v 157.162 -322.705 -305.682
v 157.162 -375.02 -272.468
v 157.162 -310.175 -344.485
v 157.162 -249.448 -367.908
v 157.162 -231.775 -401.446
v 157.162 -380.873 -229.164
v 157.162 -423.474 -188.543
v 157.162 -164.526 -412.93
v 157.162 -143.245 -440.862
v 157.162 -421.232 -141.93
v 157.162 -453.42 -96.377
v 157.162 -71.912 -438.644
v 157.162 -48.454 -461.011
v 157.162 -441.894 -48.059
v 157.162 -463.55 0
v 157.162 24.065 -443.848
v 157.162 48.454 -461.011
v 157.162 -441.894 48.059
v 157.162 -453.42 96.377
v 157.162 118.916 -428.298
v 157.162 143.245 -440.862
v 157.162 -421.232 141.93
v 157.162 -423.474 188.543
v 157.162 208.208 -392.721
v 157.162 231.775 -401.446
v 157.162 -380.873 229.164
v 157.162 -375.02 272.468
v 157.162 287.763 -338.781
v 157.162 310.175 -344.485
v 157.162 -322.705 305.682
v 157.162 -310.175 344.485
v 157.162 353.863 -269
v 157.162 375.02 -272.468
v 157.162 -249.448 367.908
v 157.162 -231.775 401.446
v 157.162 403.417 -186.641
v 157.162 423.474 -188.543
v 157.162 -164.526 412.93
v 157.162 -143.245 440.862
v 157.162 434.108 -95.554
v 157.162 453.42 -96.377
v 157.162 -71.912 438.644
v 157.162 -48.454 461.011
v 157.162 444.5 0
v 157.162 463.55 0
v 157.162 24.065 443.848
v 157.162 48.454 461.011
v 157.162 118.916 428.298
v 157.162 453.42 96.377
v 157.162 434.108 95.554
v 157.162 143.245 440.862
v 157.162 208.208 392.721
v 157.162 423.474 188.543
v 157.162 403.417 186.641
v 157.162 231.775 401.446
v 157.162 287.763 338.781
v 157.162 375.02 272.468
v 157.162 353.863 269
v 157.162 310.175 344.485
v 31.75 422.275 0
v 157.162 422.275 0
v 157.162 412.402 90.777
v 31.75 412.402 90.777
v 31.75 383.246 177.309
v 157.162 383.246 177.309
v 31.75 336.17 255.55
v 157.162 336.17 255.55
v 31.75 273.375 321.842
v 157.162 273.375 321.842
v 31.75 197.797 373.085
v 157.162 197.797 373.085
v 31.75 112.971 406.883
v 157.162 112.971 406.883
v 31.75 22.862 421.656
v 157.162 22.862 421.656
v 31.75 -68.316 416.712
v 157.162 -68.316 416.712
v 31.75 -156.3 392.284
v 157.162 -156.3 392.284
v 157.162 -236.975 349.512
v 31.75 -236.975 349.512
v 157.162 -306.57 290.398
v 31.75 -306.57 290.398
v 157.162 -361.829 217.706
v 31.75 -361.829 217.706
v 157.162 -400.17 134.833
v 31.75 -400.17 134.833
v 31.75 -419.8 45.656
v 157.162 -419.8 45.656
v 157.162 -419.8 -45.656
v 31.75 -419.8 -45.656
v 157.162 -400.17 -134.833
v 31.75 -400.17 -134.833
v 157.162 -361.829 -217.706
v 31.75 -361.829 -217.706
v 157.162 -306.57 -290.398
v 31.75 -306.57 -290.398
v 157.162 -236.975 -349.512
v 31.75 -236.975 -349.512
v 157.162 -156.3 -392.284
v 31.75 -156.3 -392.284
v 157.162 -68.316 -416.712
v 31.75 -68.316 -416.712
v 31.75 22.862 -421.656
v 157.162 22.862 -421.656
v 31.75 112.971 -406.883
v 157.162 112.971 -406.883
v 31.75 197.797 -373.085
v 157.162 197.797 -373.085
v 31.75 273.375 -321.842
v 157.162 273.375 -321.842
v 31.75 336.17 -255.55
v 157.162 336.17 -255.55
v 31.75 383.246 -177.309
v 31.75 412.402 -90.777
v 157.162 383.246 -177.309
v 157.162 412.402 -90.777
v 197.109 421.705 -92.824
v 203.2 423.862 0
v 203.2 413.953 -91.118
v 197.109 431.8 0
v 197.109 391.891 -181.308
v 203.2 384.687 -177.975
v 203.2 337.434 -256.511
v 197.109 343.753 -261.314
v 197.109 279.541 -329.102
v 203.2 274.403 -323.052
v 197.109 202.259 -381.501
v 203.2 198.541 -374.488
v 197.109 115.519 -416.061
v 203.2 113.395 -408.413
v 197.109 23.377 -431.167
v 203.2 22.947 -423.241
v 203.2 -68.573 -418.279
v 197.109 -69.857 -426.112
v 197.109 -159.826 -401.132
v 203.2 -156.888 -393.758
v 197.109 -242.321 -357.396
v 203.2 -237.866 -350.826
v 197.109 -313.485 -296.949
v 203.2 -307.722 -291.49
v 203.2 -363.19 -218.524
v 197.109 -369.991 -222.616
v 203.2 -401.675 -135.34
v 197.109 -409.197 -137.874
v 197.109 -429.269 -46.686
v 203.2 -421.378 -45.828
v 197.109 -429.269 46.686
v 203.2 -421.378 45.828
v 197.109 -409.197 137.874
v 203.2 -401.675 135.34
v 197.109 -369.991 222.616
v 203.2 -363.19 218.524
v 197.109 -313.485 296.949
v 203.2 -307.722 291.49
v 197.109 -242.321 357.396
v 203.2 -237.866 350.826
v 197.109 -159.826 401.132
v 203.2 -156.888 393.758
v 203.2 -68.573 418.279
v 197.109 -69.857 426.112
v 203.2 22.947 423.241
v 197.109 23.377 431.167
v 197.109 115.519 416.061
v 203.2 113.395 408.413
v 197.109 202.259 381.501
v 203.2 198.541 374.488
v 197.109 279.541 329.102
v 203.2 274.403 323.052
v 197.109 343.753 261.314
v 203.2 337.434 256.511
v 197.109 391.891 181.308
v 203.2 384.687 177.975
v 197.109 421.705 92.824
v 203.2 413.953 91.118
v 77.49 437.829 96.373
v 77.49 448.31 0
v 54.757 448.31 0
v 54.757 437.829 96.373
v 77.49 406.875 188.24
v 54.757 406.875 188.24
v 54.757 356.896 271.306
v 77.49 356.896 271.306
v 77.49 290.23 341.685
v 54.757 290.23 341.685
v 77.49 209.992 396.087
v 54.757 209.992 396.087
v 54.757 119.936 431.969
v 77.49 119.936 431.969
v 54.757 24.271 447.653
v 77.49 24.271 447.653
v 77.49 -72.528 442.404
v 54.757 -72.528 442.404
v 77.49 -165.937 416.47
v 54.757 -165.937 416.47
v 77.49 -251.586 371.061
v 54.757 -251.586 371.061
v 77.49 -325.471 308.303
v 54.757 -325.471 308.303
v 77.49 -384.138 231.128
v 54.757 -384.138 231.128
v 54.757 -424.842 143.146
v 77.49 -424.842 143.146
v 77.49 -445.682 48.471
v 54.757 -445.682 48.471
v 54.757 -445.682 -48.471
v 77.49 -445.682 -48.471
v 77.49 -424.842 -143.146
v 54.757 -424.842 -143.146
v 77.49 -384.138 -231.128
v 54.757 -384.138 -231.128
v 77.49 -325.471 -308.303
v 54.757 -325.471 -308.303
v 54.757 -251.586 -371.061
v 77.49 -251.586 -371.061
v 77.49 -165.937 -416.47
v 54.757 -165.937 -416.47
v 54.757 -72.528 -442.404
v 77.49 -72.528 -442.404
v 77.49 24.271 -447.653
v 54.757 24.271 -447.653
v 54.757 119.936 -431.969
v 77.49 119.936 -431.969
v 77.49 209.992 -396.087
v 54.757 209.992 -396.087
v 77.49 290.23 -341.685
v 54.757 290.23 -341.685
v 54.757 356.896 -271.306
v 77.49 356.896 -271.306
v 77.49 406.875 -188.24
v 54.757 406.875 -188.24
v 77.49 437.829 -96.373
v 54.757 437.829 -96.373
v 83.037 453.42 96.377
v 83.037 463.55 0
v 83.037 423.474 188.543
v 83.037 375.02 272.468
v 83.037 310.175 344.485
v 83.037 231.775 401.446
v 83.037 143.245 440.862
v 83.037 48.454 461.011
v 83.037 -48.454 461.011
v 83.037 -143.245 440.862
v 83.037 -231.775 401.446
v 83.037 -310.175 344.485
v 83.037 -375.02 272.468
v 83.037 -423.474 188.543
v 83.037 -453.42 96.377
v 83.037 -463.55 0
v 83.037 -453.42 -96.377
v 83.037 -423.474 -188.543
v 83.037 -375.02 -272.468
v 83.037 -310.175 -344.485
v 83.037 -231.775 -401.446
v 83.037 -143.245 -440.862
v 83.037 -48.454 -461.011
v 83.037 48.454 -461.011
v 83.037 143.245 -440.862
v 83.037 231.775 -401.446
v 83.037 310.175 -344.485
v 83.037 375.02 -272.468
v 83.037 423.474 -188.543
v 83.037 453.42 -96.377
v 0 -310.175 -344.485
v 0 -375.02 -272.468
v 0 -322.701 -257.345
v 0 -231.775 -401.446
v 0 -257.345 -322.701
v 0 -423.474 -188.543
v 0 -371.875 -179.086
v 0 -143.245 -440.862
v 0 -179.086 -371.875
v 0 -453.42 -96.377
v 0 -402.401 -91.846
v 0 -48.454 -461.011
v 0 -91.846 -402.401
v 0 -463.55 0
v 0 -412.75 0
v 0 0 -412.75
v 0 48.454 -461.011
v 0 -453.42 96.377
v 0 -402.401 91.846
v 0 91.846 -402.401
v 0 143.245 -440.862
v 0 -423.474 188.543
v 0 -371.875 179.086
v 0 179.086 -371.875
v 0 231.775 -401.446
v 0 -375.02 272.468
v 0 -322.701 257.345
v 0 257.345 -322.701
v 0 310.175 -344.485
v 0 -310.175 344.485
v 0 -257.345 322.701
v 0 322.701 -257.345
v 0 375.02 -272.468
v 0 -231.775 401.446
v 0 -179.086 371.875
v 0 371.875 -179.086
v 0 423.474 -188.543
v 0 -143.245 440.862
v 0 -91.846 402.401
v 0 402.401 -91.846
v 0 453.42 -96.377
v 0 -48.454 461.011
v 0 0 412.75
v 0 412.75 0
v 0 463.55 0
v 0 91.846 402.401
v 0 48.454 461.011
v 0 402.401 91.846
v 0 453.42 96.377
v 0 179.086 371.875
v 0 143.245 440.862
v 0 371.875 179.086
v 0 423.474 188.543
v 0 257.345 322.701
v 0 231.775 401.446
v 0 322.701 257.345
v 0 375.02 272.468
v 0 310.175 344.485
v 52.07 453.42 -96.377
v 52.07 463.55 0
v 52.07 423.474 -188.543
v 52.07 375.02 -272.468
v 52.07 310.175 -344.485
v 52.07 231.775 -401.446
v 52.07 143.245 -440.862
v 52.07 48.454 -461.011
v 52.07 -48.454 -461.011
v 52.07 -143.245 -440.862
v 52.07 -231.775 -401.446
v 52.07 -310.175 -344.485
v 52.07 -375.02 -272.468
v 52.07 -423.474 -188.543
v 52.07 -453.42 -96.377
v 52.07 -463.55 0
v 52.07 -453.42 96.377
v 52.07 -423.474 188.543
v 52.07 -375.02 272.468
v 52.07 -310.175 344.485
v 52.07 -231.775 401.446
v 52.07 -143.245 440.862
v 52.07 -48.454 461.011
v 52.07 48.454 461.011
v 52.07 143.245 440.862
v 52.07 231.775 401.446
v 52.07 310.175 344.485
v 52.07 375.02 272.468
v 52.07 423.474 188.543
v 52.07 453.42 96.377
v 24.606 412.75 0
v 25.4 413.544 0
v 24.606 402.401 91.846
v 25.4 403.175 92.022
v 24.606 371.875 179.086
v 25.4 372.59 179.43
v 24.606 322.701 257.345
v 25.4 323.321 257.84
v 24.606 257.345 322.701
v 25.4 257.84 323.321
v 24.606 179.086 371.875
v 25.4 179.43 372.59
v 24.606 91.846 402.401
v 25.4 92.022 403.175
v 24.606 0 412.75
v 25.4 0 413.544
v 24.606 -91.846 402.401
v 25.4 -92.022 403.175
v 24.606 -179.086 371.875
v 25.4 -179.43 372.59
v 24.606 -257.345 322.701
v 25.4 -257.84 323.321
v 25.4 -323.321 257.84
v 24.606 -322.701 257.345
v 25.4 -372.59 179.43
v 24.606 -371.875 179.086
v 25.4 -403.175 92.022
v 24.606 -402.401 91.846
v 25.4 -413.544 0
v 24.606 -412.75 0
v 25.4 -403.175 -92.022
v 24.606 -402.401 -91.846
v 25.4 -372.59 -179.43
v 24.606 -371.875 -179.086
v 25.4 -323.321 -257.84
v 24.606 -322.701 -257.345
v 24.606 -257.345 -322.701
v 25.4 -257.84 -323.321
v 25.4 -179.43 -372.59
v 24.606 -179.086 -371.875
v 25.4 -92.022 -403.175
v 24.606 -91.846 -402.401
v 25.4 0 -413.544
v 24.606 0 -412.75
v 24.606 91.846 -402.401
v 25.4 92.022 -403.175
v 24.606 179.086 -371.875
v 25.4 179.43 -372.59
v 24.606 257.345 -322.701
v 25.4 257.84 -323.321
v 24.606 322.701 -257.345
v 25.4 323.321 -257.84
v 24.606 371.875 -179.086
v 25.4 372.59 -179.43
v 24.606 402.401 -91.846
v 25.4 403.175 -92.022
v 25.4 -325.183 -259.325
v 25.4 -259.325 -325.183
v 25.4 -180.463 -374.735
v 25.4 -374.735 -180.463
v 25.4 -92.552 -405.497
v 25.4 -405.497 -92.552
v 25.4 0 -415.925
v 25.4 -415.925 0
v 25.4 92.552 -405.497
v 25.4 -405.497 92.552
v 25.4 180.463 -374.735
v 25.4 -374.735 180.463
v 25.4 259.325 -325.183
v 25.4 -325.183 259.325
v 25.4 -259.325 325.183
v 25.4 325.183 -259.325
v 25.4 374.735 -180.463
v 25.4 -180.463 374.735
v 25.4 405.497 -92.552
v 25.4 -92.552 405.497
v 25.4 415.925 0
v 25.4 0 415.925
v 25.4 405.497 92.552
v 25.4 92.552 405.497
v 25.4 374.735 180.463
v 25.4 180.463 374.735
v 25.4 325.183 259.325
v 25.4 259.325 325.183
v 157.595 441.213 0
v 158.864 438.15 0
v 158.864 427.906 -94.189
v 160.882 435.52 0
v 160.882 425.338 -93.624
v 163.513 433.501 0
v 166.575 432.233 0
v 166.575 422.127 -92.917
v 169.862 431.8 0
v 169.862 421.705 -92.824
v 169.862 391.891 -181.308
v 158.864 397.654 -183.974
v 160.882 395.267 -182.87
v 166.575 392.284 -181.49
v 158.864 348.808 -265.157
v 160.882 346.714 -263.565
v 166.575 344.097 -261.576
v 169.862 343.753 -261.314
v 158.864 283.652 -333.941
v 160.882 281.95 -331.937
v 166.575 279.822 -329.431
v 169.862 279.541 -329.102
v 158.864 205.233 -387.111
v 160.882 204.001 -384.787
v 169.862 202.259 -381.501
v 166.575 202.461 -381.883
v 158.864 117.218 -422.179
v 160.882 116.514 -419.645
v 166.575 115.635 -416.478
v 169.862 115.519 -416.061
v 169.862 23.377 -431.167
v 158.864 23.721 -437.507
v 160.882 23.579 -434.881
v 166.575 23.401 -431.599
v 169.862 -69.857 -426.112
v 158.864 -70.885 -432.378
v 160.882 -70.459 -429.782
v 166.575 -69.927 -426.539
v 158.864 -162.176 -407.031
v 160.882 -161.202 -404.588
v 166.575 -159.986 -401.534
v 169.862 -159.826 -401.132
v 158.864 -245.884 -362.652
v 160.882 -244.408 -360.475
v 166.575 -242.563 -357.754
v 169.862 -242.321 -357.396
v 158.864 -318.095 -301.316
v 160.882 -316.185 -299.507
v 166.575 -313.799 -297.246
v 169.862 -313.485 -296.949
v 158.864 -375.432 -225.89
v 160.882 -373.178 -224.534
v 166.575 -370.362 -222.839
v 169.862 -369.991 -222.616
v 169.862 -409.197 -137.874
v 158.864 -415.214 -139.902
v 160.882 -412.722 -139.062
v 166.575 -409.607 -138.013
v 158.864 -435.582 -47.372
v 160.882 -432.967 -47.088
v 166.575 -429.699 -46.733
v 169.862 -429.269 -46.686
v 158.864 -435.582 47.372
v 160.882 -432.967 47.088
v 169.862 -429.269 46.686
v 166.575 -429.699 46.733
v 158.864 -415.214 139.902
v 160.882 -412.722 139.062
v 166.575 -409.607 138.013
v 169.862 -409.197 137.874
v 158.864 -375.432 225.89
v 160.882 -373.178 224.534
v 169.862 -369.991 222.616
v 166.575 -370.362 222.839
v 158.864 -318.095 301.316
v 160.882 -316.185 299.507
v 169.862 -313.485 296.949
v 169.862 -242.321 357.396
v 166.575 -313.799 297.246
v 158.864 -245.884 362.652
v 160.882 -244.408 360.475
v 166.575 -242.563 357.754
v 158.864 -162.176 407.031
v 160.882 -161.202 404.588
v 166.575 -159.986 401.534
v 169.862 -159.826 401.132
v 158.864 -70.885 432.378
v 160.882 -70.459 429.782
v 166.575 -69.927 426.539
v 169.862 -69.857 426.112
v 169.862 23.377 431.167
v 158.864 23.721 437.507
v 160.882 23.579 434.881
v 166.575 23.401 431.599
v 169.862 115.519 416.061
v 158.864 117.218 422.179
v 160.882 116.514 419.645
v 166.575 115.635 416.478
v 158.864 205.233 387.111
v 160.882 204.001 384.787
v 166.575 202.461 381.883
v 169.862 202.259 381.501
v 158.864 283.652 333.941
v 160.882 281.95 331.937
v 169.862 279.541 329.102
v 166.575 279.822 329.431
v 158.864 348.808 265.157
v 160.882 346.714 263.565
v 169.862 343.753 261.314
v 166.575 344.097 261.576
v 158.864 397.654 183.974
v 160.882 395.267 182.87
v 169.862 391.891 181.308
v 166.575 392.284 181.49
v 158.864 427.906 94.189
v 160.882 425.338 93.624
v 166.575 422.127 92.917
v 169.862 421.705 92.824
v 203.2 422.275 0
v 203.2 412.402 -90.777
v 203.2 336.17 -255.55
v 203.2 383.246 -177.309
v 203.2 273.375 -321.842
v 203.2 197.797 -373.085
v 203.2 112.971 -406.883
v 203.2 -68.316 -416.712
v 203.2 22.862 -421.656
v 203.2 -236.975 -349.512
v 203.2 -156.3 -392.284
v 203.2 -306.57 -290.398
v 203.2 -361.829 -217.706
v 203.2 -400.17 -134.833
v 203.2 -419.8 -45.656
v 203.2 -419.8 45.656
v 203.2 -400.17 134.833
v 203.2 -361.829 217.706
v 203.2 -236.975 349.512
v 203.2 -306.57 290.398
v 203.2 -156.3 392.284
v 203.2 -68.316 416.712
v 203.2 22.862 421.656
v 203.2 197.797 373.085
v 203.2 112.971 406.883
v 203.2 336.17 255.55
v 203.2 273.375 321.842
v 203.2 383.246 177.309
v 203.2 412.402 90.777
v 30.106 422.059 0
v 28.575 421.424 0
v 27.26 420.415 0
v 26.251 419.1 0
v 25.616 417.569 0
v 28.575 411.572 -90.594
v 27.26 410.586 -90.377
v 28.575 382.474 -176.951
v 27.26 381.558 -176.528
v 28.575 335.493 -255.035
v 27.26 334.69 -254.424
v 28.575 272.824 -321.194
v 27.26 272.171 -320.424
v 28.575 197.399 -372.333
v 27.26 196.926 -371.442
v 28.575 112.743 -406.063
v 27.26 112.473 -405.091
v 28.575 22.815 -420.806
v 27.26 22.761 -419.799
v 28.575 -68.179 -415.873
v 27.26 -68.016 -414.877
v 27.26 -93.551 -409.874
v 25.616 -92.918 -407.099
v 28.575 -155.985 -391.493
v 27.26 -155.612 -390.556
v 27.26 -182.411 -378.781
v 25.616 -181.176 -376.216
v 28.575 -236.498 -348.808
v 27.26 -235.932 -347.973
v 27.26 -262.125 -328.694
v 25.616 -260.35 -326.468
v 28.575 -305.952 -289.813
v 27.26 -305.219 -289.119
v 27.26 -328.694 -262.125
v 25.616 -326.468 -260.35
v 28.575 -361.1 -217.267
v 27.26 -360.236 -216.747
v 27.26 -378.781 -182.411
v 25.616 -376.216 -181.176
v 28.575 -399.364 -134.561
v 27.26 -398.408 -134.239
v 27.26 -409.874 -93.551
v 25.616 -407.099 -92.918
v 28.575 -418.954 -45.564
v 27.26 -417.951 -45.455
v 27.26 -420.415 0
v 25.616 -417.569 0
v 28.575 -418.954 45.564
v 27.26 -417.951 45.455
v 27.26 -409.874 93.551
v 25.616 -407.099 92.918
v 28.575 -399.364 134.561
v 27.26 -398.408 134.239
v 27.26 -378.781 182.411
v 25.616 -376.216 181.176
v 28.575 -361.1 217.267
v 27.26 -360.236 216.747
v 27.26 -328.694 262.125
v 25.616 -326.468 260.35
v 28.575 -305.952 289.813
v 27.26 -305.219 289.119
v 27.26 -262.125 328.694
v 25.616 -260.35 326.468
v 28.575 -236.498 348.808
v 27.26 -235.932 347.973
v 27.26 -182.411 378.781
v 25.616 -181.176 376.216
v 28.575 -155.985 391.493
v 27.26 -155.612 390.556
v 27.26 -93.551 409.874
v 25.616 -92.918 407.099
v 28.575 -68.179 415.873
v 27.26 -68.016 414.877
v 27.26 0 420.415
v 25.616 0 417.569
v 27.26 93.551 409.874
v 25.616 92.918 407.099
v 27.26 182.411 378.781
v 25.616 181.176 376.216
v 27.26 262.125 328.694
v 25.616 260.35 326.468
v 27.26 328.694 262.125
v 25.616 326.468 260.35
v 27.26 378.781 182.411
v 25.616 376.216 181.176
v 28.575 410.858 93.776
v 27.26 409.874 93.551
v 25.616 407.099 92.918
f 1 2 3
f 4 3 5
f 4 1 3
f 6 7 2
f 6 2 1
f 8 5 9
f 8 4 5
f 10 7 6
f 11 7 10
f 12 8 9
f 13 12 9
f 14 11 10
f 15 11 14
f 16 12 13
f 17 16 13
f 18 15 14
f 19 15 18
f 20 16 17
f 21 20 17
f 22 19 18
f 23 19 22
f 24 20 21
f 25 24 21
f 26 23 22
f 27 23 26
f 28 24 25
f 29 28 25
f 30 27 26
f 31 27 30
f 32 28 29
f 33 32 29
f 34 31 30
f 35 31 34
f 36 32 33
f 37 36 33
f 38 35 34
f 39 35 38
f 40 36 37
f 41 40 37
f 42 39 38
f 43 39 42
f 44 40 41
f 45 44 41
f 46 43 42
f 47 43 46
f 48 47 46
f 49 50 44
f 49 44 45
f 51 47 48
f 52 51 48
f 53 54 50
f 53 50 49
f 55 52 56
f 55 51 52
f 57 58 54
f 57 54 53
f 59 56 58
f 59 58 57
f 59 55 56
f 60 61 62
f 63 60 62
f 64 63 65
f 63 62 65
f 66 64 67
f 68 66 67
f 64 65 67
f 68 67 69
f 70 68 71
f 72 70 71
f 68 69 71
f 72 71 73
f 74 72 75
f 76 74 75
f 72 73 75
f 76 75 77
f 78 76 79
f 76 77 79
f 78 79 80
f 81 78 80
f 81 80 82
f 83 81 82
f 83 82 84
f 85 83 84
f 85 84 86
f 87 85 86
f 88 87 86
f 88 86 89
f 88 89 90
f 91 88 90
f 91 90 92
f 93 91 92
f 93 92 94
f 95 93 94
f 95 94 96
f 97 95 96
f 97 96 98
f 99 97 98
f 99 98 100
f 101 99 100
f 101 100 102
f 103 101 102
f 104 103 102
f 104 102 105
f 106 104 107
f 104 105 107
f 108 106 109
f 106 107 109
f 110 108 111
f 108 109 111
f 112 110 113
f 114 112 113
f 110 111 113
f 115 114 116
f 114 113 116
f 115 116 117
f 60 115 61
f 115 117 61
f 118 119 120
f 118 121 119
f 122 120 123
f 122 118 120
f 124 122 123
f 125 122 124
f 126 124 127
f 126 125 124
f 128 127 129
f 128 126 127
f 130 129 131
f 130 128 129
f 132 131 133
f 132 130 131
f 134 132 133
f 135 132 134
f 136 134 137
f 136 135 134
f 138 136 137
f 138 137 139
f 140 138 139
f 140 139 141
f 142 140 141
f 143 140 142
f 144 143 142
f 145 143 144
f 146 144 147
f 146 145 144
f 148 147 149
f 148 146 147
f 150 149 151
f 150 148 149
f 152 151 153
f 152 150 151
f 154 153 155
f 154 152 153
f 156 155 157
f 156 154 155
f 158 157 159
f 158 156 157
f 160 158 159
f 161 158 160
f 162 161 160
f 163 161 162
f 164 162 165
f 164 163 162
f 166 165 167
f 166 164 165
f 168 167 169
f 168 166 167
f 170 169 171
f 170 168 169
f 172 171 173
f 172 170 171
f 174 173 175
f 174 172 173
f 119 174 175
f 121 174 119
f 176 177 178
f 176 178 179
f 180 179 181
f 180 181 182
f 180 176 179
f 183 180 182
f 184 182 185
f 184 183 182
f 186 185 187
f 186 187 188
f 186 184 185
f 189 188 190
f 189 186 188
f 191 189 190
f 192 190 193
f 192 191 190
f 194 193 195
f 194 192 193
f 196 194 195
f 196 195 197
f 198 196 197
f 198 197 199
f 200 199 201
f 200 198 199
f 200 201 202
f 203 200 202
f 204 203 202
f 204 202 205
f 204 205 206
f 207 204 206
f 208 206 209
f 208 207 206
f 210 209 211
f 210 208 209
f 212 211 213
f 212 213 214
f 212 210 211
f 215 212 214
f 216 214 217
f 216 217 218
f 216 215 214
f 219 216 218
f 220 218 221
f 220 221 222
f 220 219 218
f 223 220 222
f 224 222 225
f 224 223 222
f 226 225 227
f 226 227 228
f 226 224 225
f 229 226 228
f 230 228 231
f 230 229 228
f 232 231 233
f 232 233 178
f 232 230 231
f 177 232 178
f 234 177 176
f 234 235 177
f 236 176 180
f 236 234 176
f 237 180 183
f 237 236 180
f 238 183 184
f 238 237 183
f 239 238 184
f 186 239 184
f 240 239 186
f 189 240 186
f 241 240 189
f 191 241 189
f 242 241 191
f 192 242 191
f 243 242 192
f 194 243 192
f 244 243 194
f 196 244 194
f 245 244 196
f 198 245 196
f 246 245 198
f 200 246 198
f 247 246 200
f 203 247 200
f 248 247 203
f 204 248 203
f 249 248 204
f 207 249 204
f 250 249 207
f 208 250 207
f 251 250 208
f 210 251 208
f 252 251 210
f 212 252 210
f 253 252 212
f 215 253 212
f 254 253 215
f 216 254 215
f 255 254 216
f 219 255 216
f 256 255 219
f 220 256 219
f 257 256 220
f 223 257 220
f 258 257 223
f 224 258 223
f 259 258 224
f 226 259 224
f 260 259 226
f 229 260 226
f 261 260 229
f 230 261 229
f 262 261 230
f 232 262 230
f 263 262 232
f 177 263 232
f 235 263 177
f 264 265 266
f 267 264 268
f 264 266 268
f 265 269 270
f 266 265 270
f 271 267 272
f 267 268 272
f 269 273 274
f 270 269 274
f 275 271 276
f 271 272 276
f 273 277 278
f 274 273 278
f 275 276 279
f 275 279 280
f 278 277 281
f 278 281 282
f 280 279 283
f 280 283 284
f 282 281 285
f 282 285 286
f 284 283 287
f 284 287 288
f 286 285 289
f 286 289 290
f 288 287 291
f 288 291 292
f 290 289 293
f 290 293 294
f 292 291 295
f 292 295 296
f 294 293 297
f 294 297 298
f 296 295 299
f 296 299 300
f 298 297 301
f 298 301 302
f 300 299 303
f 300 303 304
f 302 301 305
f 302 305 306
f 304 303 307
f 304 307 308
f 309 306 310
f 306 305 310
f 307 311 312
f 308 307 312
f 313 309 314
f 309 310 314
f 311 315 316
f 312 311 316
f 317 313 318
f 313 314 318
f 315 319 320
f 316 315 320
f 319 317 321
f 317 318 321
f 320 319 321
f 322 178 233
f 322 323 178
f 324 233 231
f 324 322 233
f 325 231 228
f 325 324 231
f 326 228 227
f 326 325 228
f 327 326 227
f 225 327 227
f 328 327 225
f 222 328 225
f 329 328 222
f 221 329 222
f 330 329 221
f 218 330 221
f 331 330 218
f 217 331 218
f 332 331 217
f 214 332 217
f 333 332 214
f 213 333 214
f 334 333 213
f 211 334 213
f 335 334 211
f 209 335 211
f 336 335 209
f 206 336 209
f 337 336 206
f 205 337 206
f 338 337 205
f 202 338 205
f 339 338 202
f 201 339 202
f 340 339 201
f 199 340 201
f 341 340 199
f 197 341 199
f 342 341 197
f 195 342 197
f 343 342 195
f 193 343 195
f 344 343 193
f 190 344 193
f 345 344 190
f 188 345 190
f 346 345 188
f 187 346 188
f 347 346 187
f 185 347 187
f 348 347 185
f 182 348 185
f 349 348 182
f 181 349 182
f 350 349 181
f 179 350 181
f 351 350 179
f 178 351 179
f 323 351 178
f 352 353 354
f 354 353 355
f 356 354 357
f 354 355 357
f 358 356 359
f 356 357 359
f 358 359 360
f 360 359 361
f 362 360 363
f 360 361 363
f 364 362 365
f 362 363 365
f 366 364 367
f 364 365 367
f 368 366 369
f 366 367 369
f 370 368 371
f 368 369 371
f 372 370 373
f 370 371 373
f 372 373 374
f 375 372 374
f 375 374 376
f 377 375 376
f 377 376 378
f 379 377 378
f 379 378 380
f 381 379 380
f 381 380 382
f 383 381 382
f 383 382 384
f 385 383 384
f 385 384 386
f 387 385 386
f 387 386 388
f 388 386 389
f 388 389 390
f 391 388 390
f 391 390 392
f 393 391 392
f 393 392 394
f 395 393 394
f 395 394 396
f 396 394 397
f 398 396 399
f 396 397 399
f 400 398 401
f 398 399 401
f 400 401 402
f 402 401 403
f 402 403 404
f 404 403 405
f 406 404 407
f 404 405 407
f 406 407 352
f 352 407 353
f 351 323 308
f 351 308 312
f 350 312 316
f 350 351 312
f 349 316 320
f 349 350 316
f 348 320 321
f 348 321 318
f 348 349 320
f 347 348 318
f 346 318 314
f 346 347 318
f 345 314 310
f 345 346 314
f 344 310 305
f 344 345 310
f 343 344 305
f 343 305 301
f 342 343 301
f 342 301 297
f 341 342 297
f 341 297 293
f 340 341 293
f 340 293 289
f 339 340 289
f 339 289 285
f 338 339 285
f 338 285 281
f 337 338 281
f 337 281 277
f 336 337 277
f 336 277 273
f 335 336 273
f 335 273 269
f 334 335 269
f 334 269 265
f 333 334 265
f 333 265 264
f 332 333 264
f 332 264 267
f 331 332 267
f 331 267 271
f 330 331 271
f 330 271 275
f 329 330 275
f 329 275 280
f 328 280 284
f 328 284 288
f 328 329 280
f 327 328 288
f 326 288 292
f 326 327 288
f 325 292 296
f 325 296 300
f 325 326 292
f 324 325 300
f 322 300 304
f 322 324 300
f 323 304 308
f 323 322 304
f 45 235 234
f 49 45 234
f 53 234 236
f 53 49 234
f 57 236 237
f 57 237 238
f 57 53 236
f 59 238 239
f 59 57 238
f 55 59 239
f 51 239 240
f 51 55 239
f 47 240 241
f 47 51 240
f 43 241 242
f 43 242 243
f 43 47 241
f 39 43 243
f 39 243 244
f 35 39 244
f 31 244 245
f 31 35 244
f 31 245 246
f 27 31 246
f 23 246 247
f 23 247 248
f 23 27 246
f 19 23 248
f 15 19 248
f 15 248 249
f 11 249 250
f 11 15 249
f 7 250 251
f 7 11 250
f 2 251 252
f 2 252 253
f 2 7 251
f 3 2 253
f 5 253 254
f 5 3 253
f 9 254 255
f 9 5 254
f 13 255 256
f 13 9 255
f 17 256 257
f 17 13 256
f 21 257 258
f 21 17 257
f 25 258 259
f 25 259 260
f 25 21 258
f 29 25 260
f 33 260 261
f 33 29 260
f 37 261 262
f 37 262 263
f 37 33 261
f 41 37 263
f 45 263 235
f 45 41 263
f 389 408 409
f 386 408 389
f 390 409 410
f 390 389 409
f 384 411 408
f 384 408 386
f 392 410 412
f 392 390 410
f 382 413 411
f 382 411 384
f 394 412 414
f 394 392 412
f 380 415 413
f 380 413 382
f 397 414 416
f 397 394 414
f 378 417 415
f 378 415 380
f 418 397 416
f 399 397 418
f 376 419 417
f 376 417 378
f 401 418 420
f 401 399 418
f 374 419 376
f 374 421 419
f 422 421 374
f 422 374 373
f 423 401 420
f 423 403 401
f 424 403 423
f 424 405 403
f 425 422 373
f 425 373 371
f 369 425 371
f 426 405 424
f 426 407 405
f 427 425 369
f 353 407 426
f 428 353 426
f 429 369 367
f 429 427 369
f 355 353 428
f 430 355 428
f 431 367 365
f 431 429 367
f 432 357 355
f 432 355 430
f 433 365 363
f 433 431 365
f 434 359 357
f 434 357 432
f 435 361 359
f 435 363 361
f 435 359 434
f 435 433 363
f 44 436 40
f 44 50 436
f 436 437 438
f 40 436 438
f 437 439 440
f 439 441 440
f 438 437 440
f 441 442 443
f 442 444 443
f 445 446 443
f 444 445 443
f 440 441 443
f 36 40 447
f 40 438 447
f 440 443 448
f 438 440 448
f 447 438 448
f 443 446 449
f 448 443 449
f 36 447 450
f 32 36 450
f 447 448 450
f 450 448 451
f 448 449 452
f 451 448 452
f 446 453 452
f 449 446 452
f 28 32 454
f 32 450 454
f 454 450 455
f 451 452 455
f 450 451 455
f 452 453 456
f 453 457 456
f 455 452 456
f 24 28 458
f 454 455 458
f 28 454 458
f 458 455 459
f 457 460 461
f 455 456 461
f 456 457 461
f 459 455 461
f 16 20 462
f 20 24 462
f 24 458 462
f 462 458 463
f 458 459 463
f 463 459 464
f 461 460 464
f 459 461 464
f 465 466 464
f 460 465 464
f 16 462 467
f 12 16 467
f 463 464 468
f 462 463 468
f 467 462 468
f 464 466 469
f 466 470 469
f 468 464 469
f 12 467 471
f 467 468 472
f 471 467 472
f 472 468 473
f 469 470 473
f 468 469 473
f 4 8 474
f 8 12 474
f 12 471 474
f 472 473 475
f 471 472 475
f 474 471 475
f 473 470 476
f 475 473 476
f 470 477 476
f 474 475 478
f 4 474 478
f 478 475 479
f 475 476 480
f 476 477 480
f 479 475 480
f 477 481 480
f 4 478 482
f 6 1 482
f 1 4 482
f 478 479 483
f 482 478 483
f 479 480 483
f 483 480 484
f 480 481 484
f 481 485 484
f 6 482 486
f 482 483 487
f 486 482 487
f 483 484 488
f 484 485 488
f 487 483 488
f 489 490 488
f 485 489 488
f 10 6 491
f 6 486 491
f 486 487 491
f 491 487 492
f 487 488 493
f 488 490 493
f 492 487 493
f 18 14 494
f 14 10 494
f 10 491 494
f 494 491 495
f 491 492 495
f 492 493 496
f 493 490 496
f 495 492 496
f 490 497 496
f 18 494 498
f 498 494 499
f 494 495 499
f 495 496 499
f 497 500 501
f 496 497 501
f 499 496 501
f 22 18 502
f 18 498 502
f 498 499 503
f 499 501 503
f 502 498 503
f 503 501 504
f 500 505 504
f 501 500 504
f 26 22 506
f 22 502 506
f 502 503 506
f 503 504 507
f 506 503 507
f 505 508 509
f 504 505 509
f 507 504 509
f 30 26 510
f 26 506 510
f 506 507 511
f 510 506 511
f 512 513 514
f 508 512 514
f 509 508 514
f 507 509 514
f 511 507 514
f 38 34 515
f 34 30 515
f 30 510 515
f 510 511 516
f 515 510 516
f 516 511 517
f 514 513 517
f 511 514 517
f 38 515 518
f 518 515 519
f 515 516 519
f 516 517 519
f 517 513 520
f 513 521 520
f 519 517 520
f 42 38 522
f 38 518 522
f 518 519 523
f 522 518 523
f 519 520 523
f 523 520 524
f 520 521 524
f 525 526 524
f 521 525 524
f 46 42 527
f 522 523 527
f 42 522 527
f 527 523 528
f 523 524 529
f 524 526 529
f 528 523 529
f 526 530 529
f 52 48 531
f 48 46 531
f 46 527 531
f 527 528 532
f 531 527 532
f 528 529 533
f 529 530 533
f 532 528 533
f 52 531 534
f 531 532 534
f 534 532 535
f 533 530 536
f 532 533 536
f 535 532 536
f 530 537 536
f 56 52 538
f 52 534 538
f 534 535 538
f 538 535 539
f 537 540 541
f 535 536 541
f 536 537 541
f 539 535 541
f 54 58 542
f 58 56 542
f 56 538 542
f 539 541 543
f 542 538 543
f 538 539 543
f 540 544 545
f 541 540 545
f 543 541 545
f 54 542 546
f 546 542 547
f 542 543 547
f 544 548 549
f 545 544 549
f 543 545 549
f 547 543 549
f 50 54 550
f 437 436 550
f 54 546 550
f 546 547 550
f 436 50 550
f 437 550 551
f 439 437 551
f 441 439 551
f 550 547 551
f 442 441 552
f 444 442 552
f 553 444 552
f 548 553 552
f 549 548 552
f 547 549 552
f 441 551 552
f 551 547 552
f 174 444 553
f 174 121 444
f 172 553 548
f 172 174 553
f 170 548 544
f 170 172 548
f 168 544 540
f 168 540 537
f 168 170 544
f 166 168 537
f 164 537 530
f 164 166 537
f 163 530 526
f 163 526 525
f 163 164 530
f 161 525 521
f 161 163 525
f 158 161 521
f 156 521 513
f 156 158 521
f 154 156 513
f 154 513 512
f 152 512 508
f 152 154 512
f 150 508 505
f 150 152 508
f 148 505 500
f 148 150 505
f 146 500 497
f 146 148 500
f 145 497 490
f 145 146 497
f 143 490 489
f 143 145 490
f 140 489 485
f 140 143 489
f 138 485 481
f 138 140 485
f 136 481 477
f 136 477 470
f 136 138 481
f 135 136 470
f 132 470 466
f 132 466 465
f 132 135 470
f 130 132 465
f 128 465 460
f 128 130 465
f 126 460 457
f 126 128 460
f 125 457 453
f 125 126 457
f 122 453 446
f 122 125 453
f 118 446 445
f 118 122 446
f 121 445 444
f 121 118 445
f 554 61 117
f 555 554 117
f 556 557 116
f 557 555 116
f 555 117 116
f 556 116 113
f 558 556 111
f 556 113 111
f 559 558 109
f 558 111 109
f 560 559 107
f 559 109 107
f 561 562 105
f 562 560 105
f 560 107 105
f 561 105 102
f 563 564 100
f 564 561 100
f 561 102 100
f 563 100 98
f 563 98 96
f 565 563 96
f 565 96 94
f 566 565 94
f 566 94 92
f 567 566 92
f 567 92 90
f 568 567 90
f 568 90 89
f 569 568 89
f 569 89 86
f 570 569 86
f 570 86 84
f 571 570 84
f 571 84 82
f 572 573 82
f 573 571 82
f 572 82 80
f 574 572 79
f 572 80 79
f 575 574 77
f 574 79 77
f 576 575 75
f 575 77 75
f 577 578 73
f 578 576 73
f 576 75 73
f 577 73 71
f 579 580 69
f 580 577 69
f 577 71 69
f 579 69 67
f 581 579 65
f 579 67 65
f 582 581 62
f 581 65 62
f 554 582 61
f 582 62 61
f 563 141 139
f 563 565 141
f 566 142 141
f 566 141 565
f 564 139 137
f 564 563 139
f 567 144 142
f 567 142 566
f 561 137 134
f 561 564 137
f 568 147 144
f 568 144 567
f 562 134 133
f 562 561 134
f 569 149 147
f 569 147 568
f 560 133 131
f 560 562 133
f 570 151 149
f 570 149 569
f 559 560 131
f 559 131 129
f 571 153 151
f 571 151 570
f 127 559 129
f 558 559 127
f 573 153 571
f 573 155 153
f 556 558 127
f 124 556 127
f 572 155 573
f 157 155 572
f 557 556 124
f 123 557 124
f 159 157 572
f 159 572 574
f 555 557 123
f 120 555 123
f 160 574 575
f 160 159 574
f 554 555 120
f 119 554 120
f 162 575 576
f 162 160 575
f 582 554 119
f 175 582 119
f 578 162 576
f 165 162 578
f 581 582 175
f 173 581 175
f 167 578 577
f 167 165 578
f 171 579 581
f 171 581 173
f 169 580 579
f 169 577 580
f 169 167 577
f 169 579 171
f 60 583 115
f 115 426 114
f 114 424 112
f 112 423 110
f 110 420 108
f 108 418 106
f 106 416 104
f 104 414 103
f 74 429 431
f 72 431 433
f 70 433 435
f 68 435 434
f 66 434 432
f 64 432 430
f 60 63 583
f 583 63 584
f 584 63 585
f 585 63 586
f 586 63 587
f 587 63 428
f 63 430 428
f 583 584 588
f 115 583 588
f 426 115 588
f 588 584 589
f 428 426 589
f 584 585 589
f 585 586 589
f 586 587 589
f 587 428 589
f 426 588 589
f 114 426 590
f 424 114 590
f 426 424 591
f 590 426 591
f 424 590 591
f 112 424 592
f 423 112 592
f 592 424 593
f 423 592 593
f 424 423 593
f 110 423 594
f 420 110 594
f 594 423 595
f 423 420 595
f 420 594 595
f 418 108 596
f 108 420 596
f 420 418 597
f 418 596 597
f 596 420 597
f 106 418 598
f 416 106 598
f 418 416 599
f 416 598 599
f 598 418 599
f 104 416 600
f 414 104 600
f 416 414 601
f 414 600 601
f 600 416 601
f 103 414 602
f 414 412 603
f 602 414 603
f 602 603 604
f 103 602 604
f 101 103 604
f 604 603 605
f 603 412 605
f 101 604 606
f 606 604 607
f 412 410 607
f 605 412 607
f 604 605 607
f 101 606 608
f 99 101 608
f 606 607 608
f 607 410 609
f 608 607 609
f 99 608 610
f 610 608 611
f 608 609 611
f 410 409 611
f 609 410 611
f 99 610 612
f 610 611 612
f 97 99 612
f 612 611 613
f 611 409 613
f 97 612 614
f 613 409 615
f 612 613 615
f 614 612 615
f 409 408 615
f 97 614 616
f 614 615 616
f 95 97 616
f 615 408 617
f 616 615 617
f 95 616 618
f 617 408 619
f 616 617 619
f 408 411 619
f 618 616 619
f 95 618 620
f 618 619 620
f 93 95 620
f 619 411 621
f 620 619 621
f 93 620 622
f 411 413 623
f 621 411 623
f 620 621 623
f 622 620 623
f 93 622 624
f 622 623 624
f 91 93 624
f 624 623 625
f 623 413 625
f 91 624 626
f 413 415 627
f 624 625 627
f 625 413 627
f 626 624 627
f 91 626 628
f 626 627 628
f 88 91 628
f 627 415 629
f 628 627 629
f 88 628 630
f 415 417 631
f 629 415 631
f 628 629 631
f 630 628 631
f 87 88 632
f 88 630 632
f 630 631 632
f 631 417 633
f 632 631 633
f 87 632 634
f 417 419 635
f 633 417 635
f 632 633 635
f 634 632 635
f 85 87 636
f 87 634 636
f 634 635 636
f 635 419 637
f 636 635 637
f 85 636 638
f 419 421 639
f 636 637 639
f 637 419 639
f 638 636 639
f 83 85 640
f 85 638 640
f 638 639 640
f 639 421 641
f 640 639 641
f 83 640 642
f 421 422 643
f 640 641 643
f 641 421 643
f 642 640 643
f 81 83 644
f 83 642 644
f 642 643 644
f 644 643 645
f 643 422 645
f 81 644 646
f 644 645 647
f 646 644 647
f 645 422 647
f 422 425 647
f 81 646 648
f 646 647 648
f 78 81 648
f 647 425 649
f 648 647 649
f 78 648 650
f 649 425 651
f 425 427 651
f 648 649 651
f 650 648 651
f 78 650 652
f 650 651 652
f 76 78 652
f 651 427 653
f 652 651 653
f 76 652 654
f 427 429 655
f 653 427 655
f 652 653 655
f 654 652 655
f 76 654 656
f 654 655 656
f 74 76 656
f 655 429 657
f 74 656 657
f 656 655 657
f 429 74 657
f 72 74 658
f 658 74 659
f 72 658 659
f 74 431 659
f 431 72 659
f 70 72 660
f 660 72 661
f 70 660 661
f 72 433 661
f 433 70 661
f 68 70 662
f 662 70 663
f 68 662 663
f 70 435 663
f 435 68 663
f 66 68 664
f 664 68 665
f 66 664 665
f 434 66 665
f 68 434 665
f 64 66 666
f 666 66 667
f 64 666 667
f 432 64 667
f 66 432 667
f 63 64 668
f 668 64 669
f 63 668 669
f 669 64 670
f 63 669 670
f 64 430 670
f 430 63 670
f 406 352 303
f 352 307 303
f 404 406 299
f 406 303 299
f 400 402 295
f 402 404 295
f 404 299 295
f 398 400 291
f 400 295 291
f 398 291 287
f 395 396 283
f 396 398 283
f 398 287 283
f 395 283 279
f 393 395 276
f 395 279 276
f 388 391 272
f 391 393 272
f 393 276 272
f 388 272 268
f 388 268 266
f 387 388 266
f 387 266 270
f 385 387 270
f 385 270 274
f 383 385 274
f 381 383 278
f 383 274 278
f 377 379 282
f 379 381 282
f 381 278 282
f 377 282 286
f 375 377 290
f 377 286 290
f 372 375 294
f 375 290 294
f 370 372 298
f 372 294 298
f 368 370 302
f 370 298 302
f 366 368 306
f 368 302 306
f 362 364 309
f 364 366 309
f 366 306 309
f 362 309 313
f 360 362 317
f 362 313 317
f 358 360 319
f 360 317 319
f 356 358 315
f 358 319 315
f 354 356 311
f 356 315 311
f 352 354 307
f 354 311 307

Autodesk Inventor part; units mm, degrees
ref_plane "YZ Plane" through (0, 0, 0) normal (1, 0, 0) x (0, 1, 0)
ref_plane "XZ Plane" through (0, 0, 0) normal (0, 1, 0) x (-1, 0, 0)
ref_plane "XY Plane" through (0, 0, 0) normal (0, 0, 1) x (1, 0, 0)
sketch "Sketch1" plane through (0, 0, 0) normal (0, 0, 1) x (1, 0, 0)
  line L0 (0, 412.75) -> (0, 463.55)
  line L1 (0, 463.55) -> (52.07, 463.55)
  line L2 (52.07, 463.55) -> (54.7572, 448.31)
  line L3 (54.7572, 448.31) -> (77.4902, 448.31)
  line L4 (77.4902, 448.31) -> (83.0371, 463.55)
  line L5 (83.0371, 463.55) -> (157.1625, 463.55)
  line L6 (169.8625, 431.8) -> (197.1093, 431.8)
  line L7 (197.1093, 431.8) -> (203.2, 423.8625)
  line L8 (203.2, 422.275) -> (157.1625, 422.275)
  line L9 (25.4, 415.925) -> (25.4, 412.75)
  line L10 (25.4, 412.75) -> (0, 412.75)
  arc A0 (31.75, 422.275) -> (25.4, 415.925) centre (31.75, 415.925) ccw
  line L11 (-40.64, 0) -> (243.84, 0) projected
  line L12 (203.2, 422.275) -> (203.2, 423.8625)
  line L13 (31.75, 422.275) -> (157.1625, 422.275)
  line L14 (157.1625, 463.55) -> (157.1625, 444.5)
  arc A1 (157.1625, 444.5) -> (169.8625, 431.8) centre (169.8625, 444.5) ccw
  point P0 (0, 0)
  dimension "d0" = 463.55
  dimension "d3" = 431.8
  dimension "d5" = 7.9375
  dimension "d10" = 6.35
  dimension "d12" = 412.75
  dimension "d13" = 52.07
  dimension "d17" = 9.525
  dimension "d35" = 25.4
  dimension "d38" = 10
  dimension "d39" = 20
  dimension "d40" = 22.733
  dimension "d41" = 15.24
  dimension "d44" = 203.2
  dimension "d45" = 37.5
  dimension "d55" = 422.275
  dimension "d58" = 12.7
  dimension "d59" = 157.1625
revolve "Revolution1" add sketch "Sketch1" angle 360 about axis through (-10, 0, 0) along (1, 0, 0)
chamfer "Chamfer2" distance 0.7937 angle 45 2 edges at (25.4, -415.925, 0) (25.4, -412.75, 0)
properties part number "A1-19027-400-04 34in Type B Victaulic ring" material "Steel, Mild"
